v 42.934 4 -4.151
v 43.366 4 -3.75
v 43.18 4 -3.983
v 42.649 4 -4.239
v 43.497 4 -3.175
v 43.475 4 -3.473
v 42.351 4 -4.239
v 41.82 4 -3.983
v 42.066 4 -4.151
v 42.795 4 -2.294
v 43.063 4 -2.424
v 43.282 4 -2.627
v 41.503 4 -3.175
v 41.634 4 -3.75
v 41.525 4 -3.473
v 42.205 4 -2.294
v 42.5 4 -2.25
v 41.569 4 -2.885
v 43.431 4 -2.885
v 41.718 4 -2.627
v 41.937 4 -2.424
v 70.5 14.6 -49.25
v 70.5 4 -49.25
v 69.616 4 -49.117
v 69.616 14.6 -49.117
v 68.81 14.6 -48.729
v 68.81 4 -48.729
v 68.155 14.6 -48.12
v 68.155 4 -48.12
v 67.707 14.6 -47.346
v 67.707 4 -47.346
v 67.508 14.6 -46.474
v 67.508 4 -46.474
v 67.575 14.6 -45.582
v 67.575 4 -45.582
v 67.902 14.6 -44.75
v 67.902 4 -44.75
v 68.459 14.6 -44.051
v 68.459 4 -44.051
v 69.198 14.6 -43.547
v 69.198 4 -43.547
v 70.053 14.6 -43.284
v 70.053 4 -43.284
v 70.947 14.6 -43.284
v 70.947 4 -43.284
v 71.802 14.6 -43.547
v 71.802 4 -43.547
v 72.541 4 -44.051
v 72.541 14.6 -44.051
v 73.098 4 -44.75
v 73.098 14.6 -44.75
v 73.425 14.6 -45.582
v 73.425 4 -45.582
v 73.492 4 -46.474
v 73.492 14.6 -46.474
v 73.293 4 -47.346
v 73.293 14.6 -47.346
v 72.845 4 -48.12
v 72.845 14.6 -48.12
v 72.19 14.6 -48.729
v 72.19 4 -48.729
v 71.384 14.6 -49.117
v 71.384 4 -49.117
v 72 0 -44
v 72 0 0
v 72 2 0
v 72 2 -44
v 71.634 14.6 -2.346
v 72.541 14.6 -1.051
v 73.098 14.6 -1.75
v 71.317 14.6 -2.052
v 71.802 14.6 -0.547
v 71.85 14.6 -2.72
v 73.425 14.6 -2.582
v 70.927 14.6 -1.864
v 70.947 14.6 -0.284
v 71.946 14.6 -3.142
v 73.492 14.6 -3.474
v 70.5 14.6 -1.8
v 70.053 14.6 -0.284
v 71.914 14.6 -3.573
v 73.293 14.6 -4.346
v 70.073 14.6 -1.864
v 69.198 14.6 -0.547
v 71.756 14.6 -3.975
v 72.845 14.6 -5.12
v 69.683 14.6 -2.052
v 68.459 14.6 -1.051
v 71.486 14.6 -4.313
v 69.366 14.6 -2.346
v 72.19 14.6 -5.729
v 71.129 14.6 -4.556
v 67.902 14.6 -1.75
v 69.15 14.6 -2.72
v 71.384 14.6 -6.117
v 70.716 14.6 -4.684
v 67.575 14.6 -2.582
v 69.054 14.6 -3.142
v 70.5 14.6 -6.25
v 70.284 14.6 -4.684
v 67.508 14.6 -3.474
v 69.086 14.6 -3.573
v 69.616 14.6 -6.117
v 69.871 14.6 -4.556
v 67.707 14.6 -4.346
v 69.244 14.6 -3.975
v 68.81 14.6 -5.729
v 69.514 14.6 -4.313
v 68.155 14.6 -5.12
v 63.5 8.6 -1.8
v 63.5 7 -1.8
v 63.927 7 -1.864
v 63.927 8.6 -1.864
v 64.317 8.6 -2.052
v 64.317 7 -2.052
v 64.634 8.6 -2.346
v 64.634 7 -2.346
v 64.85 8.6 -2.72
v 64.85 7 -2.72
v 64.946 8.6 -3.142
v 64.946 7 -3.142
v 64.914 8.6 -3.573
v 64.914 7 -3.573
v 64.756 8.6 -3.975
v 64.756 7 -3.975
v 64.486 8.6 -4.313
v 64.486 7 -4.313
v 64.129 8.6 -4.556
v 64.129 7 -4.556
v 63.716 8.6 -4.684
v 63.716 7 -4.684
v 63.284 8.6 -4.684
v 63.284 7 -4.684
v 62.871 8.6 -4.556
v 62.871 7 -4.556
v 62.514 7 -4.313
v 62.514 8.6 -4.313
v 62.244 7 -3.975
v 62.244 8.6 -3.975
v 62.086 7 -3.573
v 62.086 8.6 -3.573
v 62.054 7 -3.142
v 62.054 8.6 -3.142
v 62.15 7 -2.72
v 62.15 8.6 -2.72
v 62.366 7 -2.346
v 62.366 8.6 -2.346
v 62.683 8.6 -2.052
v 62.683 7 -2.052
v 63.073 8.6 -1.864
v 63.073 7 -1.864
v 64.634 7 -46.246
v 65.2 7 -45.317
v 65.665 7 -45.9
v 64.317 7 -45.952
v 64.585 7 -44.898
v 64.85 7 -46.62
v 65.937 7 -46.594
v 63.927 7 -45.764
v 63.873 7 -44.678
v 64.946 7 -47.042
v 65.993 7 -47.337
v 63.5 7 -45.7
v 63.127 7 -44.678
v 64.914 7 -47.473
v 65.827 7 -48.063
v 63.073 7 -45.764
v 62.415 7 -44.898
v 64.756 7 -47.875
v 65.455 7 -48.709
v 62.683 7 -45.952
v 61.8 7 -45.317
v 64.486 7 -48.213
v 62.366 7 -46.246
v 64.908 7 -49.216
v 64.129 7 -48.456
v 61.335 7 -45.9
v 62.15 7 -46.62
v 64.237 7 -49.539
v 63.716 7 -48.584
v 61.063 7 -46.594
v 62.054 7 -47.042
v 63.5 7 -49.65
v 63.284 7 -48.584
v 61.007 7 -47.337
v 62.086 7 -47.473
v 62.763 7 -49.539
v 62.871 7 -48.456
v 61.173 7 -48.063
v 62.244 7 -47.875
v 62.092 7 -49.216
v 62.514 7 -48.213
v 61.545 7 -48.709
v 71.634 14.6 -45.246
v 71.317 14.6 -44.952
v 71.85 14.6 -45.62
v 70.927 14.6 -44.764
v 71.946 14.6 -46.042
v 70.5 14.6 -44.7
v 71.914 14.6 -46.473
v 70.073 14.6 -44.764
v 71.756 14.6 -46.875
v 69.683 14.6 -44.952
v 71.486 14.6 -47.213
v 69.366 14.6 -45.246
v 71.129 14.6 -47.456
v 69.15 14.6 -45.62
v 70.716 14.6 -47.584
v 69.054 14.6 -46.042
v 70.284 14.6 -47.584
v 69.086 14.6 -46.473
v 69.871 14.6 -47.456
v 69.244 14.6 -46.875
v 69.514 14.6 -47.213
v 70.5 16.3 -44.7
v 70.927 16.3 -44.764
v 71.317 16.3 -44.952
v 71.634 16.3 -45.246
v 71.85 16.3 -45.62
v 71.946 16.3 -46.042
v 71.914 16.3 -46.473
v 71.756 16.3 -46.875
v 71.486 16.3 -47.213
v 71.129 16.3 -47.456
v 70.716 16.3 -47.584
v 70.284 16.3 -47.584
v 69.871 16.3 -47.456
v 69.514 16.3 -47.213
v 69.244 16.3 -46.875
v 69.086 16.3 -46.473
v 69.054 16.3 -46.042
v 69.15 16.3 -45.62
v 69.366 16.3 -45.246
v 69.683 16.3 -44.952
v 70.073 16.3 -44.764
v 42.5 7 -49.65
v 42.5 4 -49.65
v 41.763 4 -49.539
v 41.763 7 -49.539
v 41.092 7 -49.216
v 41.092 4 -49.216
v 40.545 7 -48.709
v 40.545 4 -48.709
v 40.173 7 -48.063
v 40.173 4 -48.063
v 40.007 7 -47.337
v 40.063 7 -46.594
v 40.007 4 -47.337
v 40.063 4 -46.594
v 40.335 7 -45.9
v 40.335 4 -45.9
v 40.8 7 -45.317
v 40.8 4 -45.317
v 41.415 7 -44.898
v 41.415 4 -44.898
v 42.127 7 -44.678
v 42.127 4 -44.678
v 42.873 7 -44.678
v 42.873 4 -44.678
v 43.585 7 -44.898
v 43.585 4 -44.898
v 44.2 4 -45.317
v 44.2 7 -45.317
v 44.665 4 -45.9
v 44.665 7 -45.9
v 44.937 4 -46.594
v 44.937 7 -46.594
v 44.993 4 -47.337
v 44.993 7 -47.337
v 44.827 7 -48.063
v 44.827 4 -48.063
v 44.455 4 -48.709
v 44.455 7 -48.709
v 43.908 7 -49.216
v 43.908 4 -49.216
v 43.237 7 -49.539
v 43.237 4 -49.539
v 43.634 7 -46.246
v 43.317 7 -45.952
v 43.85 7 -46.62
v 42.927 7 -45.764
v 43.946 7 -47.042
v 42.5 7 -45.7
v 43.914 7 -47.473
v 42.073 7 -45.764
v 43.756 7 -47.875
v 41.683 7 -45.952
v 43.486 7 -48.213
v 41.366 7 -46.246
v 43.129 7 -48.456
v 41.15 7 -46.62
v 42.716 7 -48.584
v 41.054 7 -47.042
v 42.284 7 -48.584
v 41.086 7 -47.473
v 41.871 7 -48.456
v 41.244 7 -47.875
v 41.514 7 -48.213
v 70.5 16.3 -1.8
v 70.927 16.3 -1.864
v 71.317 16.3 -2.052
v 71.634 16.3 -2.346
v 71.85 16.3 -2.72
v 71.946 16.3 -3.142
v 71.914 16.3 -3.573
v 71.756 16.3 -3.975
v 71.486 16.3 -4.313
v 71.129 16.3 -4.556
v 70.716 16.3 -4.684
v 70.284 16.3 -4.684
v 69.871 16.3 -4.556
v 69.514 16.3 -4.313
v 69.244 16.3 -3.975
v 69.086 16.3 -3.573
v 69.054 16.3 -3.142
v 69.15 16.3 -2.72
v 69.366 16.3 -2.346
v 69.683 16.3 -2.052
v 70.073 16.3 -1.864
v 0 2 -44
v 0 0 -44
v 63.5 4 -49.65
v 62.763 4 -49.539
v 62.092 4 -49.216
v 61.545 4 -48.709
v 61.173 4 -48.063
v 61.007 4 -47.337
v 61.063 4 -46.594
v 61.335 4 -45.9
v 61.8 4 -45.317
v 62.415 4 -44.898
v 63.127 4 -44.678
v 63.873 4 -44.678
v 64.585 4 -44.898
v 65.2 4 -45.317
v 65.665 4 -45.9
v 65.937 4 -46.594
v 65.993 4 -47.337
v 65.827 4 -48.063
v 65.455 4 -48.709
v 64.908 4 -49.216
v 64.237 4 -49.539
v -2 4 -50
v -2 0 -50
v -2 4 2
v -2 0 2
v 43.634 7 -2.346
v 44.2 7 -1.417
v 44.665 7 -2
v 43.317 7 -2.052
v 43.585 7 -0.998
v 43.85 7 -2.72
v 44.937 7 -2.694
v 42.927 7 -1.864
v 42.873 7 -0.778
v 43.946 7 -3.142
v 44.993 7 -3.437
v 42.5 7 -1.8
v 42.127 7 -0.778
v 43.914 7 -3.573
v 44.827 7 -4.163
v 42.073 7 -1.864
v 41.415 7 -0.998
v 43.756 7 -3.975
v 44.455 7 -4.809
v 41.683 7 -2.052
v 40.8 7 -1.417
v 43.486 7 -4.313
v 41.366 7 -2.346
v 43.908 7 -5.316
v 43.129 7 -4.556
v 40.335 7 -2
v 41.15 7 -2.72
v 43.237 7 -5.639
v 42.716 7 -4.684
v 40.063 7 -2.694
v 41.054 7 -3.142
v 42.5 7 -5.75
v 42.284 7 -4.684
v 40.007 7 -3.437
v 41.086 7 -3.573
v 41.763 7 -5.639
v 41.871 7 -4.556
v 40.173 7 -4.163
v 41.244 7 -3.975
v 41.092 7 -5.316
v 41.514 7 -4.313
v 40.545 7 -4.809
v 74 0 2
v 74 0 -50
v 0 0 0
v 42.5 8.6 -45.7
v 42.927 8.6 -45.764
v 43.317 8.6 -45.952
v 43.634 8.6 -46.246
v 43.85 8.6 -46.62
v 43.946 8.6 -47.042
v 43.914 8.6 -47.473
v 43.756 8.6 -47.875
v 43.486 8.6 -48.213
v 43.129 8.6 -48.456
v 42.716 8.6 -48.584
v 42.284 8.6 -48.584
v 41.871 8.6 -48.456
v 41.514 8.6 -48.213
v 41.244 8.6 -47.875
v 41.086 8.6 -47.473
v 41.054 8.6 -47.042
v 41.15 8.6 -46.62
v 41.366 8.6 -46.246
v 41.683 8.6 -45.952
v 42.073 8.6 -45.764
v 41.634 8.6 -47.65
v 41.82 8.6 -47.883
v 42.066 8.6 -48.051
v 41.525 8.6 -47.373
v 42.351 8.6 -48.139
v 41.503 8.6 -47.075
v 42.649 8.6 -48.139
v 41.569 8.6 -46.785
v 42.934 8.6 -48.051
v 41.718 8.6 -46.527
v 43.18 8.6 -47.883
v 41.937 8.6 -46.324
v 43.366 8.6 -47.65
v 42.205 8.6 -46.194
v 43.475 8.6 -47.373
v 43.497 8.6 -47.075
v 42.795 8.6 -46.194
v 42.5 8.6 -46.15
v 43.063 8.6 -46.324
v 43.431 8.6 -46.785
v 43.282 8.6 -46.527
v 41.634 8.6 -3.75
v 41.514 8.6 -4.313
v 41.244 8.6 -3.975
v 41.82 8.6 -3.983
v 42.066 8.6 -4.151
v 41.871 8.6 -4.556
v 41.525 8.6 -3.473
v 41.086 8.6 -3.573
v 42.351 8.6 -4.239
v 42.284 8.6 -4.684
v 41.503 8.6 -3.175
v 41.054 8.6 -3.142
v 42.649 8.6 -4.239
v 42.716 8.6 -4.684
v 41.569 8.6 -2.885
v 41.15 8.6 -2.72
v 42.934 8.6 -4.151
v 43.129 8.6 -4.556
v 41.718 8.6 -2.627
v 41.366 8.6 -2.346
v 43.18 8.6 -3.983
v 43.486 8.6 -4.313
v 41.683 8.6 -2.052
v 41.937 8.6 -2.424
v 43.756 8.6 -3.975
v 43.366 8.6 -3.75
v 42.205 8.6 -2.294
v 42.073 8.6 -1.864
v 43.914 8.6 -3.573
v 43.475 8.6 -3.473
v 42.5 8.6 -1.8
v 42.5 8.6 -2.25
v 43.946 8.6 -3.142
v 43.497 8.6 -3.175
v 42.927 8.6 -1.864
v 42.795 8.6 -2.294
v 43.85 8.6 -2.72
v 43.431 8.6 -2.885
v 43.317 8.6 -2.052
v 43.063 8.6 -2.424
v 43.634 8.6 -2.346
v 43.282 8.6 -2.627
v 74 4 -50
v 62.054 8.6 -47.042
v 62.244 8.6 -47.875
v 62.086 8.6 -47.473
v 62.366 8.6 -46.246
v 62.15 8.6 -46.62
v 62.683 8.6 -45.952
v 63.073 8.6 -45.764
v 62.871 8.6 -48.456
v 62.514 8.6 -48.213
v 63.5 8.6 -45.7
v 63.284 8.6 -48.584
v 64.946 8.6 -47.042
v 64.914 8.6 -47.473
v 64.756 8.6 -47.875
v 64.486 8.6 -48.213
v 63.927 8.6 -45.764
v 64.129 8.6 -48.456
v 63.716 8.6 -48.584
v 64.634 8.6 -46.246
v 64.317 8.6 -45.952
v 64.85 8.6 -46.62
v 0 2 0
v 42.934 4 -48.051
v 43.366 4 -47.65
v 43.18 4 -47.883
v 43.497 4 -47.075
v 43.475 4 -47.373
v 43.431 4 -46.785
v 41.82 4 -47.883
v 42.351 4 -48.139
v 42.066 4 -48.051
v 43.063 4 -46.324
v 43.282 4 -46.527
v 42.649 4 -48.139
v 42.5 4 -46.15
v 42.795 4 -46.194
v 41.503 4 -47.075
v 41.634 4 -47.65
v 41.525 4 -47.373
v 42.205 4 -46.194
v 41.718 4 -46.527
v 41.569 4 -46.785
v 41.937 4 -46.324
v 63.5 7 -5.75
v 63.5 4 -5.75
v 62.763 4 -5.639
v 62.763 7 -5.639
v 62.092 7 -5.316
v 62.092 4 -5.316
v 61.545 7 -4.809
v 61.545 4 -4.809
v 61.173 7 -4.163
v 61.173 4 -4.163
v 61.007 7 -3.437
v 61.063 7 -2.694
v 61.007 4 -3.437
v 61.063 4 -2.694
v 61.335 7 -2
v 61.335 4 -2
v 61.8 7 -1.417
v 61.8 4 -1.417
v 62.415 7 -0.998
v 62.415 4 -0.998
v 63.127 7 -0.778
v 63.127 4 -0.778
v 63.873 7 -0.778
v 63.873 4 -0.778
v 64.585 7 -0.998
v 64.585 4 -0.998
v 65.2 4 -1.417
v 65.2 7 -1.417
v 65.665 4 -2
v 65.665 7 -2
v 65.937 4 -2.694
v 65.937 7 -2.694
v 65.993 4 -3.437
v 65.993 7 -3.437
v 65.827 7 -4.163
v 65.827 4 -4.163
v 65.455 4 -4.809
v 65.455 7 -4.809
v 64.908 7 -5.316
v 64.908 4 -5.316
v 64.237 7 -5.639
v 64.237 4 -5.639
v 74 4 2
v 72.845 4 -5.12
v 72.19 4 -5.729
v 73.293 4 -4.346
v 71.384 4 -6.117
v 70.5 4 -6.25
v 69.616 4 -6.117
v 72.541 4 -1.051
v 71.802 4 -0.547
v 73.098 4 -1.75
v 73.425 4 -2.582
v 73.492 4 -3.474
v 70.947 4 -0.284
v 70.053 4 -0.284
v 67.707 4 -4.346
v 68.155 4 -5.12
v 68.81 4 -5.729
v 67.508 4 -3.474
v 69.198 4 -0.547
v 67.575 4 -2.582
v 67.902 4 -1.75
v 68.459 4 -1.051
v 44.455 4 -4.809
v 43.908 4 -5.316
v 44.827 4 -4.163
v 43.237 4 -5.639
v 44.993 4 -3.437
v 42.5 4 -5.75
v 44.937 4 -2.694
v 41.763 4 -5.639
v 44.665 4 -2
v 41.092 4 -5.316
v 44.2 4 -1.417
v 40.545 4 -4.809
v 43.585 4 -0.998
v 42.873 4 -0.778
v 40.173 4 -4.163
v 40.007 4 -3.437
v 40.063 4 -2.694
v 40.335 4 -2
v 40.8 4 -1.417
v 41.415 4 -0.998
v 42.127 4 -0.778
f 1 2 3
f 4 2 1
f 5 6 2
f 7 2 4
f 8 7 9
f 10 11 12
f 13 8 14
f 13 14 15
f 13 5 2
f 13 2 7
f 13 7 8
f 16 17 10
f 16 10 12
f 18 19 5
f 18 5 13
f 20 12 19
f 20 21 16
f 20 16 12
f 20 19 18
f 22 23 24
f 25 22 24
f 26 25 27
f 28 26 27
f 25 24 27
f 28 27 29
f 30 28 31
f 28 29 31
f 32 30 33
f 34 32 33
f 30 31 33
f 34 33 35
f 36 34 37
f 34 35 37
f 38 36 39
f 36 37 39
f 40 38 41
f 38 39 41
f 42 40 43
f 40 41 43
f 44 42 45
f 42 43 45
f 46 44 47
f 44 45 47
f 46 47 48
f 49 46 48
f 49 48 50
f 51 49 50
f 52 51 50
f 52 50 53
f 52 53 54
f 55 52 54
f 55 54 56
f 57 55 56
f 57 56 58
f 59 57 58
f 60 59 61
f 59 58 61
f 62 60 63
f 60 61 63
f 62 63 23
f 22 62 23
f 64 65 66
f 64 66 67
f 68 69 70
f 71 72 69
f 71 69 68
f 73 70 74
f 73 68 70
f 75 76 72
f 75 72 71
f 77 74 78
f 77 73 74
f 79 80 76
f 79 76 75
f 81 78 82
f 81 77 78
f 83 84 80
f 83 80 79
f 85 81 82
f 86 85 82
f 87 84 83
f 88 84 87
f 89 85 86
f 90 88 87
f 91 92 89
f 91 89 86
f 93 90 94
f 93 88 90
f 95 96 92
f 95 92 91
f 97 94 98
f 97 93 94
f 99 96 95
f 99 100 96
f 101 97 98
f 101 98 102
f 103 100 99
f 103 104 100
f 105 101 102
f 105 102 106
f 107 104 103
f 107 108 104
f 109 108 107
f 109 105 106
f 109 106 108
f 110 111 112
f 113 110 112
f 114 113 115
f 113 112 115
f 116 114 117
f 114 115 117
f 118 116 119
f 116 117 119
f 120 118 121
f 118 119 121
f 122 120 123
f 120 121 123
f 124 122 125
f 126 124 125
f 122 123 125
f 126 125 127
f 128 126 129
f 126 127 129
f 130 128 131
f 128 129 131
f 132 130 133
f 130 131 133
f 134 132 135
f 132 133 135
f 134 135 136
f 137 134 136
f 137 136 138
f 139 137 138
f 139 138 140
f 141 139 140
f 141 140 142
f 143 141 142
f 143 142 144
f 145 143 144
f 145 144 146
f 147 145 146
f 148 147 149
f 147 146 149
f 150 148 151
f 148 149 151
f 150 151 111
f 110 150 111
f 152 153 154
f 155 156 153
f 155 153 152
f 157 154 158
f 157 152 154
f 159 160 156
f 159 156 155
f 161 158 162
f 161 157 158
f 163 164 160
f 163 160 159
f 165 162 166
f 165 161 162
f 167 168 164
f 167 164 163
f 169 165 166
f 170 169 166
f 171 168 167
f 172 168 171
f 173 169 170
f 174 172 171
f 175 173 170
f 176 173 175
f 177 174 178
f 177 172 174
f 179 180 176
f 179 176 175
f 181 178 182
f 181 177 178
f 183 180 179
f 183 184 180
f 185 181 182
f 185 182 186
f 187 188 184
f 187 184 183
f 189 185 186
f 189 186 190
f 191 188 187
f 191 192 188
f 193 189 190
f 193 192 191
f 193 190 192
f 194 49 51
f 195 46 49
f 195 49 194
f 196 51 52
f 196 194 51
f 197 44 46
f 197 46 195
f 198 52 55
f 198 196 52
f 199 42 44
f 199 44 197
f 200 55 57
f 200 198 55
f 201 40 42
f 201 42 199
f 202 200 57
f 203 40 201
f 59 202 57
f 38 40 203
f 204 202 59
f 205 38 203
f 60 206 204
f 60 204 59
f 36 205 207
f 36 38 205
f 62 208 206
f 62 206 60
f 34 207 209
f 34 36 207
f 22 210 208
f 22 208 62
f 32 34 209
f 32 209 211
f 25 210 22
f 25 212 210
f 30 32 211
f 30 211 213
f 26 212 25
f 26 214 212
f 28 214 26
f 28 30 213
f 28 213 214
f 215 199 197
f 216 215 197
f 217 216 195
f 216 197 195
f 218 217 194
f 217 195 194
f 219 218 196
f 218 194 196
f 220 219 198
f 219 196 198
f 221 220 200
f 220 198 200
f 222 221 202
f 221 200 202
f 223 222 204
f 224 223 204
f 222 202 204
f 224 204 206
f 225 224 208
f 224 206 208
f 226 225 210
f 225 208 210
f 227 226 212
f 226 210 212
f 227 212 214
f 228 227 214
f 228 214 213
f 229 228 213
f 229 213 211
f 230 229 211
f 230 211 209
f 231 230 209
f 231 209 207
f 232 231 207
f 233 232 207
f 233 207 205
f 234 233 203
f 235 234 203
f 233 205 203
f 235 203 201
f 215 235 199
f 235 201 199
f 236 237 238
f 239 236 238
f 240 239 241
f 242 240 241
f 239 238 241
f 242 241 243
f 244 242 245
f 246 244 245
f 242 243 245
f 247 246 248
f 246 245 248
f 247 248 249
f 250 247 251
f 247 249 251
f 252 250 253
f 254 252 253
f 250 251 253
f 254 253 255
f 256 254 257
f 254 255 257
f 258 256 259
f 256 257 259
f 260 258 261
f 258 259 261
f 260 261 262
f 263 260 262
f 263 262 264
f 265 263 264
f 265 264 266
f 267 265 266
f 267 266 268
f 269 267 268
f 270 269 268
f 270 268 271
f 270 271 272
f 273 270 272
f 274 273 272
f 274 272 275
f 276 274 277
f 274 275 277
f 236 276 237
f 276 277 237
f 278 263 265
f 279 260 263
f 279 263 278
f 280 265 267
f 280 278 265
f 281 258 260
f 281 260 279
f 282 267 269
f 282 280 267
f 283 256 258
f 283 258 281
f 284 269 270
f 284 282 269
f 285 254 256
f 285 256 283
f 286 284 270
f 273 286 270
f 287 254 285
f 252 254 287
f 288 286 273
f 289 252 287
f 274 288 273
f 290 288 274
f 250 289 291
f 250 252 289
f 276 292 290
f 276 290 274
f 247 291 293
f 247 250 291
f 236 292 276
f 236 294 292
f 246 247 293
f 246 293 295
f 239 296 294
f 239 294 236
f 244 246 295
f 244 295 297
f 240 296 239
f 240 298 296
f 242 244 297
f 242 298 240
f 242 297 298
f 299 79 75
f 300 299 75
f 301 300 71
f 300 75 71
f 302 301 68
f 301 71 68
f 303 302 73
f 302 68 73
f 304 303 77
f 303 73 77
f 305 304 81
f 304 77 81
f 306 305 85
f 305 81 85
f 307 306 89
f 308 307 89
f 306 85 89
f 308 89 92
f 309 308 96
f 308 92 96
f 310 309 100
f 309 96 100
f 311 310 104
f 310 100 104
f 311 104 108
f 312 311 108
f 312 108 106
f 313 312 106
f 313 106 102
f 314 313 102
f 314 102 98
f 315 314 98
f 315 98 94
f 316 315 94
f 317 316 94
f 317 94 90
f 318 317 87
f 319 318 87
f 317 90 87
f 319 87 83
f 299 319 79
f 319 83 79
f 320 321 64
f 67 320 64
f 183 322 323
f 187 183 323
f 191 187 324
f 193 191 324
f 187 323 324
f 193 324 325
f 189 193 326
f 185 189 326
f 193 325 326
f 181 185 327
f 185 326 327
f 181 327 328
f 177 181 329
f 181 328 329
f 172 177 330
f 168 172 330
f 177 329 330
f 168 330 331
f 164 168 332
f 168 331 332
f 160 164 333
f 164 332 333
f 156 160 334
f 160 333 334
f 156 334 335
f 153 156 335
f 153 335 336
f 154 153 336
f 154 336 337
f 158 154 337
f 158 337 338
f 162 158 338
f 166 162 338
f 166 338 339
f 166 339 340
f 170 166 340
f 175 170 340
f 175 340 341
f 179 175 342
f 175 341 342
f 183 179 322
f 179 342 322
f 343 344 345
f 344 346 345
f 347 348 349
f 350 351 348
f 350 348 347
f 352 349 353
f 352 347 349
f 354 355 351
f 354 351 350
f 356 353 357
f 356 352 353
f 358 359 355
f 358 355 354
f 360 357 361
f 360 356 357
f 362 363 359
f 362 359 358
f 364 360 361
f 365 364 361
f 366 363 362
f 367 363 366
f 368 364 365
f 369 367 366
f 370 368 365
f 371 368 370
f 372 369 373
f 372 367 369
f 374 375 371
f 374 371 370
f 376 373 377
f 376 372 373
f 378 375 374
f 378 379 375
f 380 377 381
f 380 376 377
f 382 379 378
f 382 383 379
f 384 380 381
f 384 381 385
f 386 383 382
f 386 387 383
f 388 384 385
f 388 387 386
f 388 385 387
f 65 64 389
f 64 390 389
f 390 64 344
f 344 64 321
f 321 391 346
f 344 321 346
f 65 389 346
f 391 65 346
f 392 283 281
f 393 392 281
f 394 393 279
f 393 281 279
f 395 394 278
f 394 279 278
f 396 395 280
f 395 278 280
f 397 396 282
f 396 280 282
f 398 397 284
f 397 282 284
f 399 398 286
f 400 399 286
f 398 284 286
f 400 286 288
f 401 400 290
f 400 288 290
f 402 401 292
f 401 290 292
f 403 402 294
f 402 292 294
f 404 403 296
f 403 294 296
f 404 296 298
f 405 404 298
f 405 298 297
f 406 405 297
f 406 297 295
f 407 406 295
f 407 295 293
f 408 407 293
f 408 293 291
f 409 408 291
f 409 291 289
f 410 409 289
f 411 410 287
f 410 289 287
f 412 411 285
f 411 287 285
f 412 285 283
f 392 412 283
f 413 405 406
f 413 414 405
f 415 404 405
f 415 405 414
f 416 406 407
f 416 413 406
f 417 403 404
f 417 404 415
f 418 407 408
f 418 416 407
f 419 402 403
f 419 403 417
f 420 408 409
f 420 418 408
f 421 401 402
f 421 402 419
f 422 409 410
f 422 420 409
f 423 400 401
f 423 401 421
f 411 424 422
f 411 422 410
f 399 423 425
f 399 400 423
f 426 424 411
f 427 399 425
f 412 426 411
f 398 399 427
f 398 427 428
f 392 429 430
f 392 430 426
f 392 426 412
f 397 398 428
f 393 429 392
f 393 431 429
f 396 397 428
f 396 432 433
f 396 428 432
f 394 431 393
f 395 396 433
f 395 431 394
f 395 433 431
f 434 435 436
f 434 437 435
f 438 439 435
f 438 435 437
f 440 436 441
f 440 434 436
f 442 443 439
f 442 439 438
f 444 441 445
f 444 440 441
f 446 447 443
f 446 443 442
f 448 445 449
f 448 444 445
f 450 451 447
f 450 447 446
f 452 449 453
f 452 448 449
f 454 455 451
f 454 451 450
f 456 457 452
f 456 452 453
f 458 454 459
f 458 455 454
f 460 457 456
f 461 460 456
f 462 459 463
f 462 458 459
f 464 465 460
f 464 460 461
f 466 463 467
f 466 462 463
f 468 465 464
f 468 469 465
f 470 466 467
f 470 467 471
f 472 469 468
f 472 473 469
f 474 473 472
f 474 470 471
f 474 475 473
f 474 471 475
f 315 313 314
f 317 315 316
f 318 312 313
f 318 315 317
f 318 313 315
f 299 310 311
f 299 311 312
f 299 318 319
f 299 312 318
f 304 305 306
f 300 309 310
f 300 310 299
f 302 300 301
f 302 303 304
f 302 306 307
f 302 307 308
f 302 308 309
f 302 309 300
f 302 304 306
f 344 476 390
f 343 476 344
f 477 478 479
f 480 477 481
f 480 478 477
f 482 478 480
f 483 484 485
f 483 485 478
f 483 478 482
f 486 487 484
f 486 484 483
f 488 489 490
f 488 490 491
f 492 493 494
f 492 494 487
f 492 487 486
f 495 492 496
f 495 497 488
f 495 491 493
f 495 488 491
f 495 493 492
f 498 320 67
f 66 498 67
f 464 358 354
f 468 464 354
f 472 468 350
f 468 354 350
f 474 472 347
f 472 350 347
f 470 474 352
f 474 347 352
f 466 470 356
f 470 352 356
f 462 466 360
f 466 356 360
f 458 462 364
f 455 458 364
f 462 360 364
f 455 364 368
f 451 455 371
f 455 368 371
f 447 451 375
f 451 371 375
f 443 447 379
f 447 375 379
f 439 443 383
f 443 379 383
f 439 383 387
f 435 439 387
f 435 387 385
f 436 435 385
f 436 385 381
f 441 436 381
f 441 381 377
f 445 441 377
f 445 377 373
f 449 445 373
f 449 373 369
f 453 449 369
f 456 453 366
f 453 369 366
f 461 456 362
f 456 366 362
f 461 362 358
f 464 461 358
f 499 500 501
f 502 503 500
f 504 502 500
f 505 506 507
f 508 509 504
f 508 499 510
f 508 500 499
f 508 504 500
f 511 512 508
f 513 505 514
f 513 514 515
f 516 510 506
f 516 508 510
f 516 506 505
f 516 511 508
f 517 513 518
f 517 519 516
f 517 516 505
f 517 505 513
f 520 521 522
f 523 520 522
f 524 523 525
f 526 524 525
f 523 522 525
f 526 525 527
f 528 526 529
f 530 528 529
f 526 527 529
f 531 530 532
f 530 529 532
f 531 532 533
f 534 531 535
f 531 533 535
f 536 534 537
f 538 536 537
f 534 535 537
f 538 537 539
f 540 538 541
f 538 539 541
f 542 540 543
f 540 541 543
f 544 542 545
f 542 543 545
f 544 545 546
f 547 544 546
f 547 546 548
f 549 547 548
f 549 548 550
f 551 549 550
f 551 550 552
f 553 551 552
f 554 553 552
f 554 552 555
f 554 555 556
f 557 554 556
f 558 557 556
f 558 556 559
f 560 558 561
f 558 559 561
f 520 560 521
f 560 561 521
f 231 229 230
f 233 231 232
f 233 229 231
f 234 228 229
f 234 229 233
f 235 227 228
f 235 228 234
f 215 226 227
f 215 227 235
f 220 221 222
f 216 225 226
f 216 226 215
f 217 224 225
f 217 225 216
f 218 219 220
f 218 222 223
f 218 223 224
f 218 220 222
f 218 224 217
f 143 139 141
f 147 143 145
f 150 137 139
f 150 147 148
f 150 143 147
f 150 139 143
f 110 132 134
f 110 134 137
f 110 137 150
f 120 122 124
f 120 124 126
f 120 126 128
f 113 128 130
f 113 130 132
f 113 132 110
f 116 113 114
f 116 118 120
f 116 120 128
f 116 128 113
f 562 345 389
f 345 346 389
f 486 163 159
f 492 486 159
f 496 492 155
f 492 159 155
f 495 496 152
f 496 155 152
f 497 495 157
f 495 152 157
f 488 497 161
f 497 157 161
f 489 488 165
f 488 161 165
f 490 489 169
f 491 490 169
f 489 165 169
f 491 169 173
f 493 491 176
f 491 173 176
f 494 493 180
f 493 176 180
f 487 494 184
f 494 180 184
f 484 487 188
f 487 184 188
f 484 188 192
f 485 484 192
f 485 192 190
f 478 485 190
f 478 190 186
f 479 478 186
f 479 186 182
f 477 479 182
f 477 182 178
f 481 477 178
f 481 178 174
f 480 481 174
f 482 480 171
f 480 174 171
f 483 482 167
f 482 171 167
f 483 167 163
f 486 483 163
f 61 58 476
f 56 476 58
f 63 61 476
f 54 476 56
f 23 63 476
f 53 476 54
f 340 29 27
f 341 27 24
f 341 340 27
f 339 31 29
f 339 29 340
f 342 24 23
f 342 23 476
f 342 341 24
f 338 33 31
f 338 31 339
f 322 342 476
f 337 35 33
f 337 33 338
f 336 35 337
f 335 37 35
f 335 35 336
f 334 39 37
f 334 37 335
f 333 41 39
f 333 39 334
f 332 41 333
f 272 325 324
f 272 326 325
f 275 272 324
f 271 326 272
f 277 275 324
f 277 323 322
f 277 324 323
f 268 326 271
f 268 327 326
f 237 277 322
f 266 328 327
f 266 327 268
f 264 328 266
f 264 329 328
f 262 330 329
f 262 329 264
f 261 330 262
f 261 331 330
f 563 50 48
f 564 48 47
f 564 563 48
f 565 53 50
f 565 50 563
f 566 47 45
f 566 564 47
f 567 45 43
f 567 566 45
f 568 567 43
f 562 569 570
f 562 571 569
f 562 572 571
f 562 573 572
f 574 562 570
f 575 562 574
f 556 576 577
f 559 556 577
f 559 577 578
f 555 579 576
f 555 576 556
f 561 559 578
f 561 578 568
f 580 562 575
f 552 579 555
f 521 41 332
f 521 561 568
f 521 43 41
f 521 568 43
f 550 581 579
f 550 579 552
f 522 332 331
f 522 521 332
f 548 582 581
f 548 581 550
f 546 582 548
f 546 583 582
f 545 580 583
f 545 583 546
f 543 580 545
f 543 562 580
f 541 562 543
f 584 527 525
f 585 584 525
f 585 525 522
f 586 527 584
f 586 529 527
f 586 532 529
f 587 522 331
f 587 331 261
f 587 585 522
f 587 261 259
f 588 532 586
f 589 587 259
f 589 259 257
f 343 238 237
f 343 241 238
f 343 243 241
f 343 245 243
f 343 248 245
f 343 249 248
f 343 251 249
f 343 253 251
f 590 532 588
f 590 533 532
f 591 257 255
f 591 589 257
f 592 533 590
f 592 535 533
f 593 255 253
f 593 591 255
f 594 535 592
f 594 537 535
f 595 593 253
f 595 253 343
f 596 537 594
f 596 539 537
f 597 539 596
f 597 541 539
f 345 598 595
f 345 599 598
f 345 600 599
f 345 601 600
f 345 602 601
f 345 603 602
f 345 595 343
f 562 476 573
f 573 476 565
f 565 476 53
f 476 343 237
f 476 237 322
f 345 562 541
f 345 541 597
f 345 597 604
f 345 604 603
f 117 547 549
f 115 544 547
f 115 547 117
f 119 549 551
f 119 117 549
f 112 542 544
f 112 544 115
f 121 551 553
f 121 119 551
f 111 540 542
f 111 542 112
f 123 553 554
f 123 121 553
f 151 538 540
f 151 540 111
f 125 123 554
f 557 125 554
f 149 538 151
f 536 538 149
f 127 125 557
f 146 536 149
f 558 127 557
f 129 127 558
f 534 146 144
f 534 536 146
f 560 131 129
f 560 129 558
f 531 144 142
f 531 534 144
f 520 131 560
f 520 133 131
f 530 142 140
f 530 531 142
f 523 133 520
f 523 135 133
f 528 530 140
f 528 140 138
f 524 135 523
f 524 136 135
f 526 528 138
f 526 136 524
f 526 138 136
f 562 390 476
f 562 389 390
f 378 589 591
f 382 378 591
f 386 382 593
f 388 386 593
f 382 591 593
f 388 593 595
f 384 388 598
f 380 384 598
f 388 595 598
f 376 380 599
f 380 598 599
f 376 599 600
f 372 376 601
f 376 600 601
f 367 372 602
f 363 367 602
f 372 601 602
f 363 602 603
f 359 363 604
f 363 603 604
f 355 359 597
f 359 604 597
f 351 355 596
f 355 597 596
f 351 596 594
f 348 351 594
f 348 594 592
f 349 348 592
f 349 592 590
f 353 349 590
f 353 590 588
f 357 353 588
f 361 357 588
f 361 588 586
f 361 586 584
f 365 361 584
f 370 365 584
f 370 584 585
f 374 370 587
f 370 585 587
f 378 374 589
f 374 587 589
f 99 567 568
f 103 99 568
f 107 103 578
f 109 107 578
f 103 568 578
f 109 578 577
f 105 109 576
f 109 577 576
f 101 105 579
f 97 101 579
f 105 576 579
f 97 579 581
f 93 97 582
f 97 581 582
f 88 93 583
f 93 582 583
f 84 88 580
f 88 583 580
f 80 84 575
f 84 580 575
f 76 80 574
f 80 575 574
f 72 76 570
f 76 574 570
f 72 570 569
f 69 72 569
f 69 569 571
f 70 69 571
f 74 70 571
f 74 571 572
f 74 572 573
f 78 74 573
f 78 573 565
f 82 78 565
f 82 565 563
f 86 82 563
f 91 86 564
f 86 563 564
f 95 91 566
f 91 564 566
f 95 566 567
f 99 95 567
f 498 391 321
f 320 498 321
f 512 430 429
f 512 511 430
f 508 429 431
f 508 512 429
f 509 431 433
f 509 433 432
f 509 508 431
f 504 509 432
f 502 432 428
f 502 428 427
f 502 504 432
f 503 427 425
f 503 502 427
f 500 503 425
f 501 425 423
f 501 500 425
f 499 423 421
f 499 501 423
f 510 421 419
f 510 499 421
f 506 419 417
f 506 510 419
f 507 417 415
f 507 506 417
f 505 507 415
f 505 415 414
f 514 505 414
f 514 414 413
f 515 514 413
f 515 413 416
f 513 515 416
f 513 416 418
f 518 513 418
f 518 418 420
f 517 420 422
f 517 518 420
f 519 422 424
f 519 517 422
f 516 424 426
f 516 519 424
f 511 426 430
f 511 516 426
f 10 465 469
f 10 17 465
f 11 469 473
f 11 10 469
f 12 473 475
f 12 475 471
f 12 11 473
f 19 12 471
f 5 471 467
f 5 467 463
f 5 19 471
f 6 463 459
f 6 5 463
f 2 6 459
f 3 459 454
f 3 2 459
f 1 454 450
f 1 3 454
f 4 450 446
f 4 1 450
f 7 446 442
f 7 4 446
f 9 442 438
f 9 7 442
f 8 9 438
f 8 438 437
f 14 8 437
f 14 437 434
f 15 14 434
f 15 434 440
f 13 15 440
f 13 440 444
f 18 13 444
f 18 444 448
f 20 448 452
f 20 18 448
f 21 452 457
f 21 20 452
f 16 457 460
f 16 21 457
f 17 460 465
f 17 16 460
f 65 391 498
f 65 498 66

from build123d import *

# Parameters (mm, degrees)
SKETCH1_W           = 76
SKETCH1_H           = 48
SKETCH1_W_2         = 72
SKETCH1_H_2         = 44
BOSS_EXTRUDE1_DEPTH = 2
SKETCH2_W           = 76
SKETCH2_H           = 48
BOSS_EXTRUDE2_DEPTH = 2
SKETCH8_W           = 76
SKETCH8_H           = 4
BOSS_EXTRUDE7_DEPTH = 4
SKETCH3_R           = 2.5
SKETCH3_R_2         = 1
BOSS_EXTRUDE3_DEPTH = 3
SKETCH4_R           = 1.45
SKETCH4_R_2         = 1
BOSS_EXTRUDE4_DEPTH = 1.6
SKETCH5_R           = 3
BOSS_EXTRUDE5_DEPTH = 10.6
SKETCH7_R           = 1.45
BOSS_EXTRUDE6_DEPTH = 1.7


with BuildPart() as part:
    # Sketch1 → Boss-Extrude1 (new body)
    with BuildSketch(Plane(origin=(0, 0, 0), x_dir=(1, 0, 0), z_dir=(0, 1, 0))):
        with Locations((36, 22)):
            Rectangle(SKETCH1_W, SKETCH1_H)
        with Locations((36, 22)):
            Rectangle(SKETCH1_W_2, SKETCH1_H_2, mode=Mode.SUBTRACT)
    extrude(amount=BOSS_EXTRUDE1_DEPTH)

    # Sketch2 → Boss-Extrude2 (add)
    with BuildSketch(Plane(origin=(0, 2, 0), x_dir=(1, 0, 0), z_dir=(0, 1, 0))):
        with Locations((36, 22)):
            Rectangle(SKETCH2_W, SKETCH2_H)
    extrude(amount=BOSS_EXTRUDE2_DEPTH)

    # Sketch8 → Boss-Extrude7 (add)
    with BuildSketch(Plane(origin=(0, 0, -46), x_dir=(-1, 0, 0), z_dir=(0, 0, -1))):
        with Locations((-36, 2)):
            Rectangle(SKETCH8_W, SKETCH8_H)
    extrude(amount=BOSS_EXTRUDE7_DEPTH)

    # Sketch3 → Boss-Extrude3 (add)
    # profile 1 of 4: a face of its own
    with BuildSketch(Plane(origin=(0, 4, 0), x_dir=(1, 0, 0), z_dir=(0, 1, 0))):
        with Locations(Location((42.5, 3.25, 0), (0, 0, 90))):
            Circle(SKETCH3_R)
        with Locations(Location((42.5, 3.25, 0), (0, 0, 270))):
            Circle(SKETCH3_R_2, mode=Mode.SUBTRACT)
    # profile 2 of 4: a face of its own
    with BuildSketch(Plane(origin=(0, 4, 0), x_dir=(1, 0, 0), z_dir=(0, 1, 0))):
        with Locations(Location((63.5, 3.25, 0), (0, 0, 90))):
            Circle(SKETCH3_R)
    # profile 3 of 4: a face of its own
    with BuildSketch(Plane(origin=(0, 4, 0), x_dir=(1, 0, 0), z_dir=(0, 1, 0))):
        with Locations(Location((42.5, 47.15, 0), (0, 0, 90))):
            Circle(SKETCH3_R)
        with Locations(Location((42.5, 47.15, 0), (0, 0, 270))):
            Circle(SKETCH3_R_2, mode=Mode.SUBTRACT)
    # profile 4 of 4: a face of its own
    with BuildSketch(Plane(origin=(0, 4, 0), x_dir=(1, 0, 0), z_dir=(0, 1, 0))):
        with Locations(Location((63.5, 47.15, 0), (0, 0, 90))):
            Circle(SKETCH3_R)
    extrude(amount=BOSS_EXTRUDE3_DEPTH)

    # Sketch4 → Boss-Extrude4 (add)
    # profile 1 of 4: a face of its own
    with BuildSketch(Plane(origin=(0, 7, 0), x_dir=(1, 0, 0), z_dir=(0, 1, 0))):
        with Locations(Location((42.5, 3.25, 0), (0, 0, 270))):
            Circle(SKETCH4_R)
        with Locations(Location((42.5, 3.25, 0), (0, 0, 270))):
            Circle(SKETCH4_R_2, mode=Mode.SUBTRACT)
    # profile 2 of 4: a face of its own
    with BuildSketch(Plane(origin=(0, 7, 0), x_dir=(1, 0, 0), z_dir=(0, 1, 0))):
        with Locations(Location((42.5, 47.15, 0), (0, 0, 270))):
            Circle(SKETCH4_R)
        with Locations(Location((42.5, 47.15, 0), (0, 0, 270))):
            Circle(SKETCH4_R_2, mode=Mode.SUBTRACT)
    # profile 3 of 4: a face of its own
    with BuildSketch(Plane(origin=(0, 7, 0), x_dir=(1, 0, 0), z_dir=(0, 1, 0))):
        with Locations(Location((63.5, 3.25, 0), (0, 0, 270))):
            Circle(SKETCH4_R)
    # profile 4 of 4: a face of its own
    with BuildSketch(Plane(origin=(0, 7, 0), x_dir=(1, 0, 0), z_dir=(0, 1, 0))):
        with Locations(Location((63.5, 47.15, 0), (0, 0, 270))):
            Circle(SKETCH4_R)
    extrude(amount=BOSS_EXTRUDE4_DEPTH)

    # Sketch5 → Boss-Extrude5 (add)
    with BuildSketch(Plane(origin=(0, 4, 0), x_dir=(1, 0, 0), z_dir=(0, 1, 0))):
        with Locations(Location((70.5, 3.25, 0), (0, 0, 90))):
            Circle(SKETCH5_R)
        with Locations(Location((70.5, 46.25, 0), (0, 0, 90))):
            Circle(SKETCH5_R)
    extrude(amount=BOSS_EXTRUDE5_DEPTH)

    # Sketch7 → Boss-Extrude6 (add)
    with BuildSketch(Plane(origin=(0, 14.6, 0), x_dir=(1, 0, 0), z_dir=(0, 1, 0))):
        with Locations(Location((70.5, 3.25, 0), (0, 0, 270))):
            Circle(SKETCH7_R)
        with Locations(Location((70.5, 46.15, 0), (0, 0, 270))):
            Circle(SKETCH7_R)
    extrude(amount=BOSS_EXTRUDE6_DEPTH)


solid = part.part
